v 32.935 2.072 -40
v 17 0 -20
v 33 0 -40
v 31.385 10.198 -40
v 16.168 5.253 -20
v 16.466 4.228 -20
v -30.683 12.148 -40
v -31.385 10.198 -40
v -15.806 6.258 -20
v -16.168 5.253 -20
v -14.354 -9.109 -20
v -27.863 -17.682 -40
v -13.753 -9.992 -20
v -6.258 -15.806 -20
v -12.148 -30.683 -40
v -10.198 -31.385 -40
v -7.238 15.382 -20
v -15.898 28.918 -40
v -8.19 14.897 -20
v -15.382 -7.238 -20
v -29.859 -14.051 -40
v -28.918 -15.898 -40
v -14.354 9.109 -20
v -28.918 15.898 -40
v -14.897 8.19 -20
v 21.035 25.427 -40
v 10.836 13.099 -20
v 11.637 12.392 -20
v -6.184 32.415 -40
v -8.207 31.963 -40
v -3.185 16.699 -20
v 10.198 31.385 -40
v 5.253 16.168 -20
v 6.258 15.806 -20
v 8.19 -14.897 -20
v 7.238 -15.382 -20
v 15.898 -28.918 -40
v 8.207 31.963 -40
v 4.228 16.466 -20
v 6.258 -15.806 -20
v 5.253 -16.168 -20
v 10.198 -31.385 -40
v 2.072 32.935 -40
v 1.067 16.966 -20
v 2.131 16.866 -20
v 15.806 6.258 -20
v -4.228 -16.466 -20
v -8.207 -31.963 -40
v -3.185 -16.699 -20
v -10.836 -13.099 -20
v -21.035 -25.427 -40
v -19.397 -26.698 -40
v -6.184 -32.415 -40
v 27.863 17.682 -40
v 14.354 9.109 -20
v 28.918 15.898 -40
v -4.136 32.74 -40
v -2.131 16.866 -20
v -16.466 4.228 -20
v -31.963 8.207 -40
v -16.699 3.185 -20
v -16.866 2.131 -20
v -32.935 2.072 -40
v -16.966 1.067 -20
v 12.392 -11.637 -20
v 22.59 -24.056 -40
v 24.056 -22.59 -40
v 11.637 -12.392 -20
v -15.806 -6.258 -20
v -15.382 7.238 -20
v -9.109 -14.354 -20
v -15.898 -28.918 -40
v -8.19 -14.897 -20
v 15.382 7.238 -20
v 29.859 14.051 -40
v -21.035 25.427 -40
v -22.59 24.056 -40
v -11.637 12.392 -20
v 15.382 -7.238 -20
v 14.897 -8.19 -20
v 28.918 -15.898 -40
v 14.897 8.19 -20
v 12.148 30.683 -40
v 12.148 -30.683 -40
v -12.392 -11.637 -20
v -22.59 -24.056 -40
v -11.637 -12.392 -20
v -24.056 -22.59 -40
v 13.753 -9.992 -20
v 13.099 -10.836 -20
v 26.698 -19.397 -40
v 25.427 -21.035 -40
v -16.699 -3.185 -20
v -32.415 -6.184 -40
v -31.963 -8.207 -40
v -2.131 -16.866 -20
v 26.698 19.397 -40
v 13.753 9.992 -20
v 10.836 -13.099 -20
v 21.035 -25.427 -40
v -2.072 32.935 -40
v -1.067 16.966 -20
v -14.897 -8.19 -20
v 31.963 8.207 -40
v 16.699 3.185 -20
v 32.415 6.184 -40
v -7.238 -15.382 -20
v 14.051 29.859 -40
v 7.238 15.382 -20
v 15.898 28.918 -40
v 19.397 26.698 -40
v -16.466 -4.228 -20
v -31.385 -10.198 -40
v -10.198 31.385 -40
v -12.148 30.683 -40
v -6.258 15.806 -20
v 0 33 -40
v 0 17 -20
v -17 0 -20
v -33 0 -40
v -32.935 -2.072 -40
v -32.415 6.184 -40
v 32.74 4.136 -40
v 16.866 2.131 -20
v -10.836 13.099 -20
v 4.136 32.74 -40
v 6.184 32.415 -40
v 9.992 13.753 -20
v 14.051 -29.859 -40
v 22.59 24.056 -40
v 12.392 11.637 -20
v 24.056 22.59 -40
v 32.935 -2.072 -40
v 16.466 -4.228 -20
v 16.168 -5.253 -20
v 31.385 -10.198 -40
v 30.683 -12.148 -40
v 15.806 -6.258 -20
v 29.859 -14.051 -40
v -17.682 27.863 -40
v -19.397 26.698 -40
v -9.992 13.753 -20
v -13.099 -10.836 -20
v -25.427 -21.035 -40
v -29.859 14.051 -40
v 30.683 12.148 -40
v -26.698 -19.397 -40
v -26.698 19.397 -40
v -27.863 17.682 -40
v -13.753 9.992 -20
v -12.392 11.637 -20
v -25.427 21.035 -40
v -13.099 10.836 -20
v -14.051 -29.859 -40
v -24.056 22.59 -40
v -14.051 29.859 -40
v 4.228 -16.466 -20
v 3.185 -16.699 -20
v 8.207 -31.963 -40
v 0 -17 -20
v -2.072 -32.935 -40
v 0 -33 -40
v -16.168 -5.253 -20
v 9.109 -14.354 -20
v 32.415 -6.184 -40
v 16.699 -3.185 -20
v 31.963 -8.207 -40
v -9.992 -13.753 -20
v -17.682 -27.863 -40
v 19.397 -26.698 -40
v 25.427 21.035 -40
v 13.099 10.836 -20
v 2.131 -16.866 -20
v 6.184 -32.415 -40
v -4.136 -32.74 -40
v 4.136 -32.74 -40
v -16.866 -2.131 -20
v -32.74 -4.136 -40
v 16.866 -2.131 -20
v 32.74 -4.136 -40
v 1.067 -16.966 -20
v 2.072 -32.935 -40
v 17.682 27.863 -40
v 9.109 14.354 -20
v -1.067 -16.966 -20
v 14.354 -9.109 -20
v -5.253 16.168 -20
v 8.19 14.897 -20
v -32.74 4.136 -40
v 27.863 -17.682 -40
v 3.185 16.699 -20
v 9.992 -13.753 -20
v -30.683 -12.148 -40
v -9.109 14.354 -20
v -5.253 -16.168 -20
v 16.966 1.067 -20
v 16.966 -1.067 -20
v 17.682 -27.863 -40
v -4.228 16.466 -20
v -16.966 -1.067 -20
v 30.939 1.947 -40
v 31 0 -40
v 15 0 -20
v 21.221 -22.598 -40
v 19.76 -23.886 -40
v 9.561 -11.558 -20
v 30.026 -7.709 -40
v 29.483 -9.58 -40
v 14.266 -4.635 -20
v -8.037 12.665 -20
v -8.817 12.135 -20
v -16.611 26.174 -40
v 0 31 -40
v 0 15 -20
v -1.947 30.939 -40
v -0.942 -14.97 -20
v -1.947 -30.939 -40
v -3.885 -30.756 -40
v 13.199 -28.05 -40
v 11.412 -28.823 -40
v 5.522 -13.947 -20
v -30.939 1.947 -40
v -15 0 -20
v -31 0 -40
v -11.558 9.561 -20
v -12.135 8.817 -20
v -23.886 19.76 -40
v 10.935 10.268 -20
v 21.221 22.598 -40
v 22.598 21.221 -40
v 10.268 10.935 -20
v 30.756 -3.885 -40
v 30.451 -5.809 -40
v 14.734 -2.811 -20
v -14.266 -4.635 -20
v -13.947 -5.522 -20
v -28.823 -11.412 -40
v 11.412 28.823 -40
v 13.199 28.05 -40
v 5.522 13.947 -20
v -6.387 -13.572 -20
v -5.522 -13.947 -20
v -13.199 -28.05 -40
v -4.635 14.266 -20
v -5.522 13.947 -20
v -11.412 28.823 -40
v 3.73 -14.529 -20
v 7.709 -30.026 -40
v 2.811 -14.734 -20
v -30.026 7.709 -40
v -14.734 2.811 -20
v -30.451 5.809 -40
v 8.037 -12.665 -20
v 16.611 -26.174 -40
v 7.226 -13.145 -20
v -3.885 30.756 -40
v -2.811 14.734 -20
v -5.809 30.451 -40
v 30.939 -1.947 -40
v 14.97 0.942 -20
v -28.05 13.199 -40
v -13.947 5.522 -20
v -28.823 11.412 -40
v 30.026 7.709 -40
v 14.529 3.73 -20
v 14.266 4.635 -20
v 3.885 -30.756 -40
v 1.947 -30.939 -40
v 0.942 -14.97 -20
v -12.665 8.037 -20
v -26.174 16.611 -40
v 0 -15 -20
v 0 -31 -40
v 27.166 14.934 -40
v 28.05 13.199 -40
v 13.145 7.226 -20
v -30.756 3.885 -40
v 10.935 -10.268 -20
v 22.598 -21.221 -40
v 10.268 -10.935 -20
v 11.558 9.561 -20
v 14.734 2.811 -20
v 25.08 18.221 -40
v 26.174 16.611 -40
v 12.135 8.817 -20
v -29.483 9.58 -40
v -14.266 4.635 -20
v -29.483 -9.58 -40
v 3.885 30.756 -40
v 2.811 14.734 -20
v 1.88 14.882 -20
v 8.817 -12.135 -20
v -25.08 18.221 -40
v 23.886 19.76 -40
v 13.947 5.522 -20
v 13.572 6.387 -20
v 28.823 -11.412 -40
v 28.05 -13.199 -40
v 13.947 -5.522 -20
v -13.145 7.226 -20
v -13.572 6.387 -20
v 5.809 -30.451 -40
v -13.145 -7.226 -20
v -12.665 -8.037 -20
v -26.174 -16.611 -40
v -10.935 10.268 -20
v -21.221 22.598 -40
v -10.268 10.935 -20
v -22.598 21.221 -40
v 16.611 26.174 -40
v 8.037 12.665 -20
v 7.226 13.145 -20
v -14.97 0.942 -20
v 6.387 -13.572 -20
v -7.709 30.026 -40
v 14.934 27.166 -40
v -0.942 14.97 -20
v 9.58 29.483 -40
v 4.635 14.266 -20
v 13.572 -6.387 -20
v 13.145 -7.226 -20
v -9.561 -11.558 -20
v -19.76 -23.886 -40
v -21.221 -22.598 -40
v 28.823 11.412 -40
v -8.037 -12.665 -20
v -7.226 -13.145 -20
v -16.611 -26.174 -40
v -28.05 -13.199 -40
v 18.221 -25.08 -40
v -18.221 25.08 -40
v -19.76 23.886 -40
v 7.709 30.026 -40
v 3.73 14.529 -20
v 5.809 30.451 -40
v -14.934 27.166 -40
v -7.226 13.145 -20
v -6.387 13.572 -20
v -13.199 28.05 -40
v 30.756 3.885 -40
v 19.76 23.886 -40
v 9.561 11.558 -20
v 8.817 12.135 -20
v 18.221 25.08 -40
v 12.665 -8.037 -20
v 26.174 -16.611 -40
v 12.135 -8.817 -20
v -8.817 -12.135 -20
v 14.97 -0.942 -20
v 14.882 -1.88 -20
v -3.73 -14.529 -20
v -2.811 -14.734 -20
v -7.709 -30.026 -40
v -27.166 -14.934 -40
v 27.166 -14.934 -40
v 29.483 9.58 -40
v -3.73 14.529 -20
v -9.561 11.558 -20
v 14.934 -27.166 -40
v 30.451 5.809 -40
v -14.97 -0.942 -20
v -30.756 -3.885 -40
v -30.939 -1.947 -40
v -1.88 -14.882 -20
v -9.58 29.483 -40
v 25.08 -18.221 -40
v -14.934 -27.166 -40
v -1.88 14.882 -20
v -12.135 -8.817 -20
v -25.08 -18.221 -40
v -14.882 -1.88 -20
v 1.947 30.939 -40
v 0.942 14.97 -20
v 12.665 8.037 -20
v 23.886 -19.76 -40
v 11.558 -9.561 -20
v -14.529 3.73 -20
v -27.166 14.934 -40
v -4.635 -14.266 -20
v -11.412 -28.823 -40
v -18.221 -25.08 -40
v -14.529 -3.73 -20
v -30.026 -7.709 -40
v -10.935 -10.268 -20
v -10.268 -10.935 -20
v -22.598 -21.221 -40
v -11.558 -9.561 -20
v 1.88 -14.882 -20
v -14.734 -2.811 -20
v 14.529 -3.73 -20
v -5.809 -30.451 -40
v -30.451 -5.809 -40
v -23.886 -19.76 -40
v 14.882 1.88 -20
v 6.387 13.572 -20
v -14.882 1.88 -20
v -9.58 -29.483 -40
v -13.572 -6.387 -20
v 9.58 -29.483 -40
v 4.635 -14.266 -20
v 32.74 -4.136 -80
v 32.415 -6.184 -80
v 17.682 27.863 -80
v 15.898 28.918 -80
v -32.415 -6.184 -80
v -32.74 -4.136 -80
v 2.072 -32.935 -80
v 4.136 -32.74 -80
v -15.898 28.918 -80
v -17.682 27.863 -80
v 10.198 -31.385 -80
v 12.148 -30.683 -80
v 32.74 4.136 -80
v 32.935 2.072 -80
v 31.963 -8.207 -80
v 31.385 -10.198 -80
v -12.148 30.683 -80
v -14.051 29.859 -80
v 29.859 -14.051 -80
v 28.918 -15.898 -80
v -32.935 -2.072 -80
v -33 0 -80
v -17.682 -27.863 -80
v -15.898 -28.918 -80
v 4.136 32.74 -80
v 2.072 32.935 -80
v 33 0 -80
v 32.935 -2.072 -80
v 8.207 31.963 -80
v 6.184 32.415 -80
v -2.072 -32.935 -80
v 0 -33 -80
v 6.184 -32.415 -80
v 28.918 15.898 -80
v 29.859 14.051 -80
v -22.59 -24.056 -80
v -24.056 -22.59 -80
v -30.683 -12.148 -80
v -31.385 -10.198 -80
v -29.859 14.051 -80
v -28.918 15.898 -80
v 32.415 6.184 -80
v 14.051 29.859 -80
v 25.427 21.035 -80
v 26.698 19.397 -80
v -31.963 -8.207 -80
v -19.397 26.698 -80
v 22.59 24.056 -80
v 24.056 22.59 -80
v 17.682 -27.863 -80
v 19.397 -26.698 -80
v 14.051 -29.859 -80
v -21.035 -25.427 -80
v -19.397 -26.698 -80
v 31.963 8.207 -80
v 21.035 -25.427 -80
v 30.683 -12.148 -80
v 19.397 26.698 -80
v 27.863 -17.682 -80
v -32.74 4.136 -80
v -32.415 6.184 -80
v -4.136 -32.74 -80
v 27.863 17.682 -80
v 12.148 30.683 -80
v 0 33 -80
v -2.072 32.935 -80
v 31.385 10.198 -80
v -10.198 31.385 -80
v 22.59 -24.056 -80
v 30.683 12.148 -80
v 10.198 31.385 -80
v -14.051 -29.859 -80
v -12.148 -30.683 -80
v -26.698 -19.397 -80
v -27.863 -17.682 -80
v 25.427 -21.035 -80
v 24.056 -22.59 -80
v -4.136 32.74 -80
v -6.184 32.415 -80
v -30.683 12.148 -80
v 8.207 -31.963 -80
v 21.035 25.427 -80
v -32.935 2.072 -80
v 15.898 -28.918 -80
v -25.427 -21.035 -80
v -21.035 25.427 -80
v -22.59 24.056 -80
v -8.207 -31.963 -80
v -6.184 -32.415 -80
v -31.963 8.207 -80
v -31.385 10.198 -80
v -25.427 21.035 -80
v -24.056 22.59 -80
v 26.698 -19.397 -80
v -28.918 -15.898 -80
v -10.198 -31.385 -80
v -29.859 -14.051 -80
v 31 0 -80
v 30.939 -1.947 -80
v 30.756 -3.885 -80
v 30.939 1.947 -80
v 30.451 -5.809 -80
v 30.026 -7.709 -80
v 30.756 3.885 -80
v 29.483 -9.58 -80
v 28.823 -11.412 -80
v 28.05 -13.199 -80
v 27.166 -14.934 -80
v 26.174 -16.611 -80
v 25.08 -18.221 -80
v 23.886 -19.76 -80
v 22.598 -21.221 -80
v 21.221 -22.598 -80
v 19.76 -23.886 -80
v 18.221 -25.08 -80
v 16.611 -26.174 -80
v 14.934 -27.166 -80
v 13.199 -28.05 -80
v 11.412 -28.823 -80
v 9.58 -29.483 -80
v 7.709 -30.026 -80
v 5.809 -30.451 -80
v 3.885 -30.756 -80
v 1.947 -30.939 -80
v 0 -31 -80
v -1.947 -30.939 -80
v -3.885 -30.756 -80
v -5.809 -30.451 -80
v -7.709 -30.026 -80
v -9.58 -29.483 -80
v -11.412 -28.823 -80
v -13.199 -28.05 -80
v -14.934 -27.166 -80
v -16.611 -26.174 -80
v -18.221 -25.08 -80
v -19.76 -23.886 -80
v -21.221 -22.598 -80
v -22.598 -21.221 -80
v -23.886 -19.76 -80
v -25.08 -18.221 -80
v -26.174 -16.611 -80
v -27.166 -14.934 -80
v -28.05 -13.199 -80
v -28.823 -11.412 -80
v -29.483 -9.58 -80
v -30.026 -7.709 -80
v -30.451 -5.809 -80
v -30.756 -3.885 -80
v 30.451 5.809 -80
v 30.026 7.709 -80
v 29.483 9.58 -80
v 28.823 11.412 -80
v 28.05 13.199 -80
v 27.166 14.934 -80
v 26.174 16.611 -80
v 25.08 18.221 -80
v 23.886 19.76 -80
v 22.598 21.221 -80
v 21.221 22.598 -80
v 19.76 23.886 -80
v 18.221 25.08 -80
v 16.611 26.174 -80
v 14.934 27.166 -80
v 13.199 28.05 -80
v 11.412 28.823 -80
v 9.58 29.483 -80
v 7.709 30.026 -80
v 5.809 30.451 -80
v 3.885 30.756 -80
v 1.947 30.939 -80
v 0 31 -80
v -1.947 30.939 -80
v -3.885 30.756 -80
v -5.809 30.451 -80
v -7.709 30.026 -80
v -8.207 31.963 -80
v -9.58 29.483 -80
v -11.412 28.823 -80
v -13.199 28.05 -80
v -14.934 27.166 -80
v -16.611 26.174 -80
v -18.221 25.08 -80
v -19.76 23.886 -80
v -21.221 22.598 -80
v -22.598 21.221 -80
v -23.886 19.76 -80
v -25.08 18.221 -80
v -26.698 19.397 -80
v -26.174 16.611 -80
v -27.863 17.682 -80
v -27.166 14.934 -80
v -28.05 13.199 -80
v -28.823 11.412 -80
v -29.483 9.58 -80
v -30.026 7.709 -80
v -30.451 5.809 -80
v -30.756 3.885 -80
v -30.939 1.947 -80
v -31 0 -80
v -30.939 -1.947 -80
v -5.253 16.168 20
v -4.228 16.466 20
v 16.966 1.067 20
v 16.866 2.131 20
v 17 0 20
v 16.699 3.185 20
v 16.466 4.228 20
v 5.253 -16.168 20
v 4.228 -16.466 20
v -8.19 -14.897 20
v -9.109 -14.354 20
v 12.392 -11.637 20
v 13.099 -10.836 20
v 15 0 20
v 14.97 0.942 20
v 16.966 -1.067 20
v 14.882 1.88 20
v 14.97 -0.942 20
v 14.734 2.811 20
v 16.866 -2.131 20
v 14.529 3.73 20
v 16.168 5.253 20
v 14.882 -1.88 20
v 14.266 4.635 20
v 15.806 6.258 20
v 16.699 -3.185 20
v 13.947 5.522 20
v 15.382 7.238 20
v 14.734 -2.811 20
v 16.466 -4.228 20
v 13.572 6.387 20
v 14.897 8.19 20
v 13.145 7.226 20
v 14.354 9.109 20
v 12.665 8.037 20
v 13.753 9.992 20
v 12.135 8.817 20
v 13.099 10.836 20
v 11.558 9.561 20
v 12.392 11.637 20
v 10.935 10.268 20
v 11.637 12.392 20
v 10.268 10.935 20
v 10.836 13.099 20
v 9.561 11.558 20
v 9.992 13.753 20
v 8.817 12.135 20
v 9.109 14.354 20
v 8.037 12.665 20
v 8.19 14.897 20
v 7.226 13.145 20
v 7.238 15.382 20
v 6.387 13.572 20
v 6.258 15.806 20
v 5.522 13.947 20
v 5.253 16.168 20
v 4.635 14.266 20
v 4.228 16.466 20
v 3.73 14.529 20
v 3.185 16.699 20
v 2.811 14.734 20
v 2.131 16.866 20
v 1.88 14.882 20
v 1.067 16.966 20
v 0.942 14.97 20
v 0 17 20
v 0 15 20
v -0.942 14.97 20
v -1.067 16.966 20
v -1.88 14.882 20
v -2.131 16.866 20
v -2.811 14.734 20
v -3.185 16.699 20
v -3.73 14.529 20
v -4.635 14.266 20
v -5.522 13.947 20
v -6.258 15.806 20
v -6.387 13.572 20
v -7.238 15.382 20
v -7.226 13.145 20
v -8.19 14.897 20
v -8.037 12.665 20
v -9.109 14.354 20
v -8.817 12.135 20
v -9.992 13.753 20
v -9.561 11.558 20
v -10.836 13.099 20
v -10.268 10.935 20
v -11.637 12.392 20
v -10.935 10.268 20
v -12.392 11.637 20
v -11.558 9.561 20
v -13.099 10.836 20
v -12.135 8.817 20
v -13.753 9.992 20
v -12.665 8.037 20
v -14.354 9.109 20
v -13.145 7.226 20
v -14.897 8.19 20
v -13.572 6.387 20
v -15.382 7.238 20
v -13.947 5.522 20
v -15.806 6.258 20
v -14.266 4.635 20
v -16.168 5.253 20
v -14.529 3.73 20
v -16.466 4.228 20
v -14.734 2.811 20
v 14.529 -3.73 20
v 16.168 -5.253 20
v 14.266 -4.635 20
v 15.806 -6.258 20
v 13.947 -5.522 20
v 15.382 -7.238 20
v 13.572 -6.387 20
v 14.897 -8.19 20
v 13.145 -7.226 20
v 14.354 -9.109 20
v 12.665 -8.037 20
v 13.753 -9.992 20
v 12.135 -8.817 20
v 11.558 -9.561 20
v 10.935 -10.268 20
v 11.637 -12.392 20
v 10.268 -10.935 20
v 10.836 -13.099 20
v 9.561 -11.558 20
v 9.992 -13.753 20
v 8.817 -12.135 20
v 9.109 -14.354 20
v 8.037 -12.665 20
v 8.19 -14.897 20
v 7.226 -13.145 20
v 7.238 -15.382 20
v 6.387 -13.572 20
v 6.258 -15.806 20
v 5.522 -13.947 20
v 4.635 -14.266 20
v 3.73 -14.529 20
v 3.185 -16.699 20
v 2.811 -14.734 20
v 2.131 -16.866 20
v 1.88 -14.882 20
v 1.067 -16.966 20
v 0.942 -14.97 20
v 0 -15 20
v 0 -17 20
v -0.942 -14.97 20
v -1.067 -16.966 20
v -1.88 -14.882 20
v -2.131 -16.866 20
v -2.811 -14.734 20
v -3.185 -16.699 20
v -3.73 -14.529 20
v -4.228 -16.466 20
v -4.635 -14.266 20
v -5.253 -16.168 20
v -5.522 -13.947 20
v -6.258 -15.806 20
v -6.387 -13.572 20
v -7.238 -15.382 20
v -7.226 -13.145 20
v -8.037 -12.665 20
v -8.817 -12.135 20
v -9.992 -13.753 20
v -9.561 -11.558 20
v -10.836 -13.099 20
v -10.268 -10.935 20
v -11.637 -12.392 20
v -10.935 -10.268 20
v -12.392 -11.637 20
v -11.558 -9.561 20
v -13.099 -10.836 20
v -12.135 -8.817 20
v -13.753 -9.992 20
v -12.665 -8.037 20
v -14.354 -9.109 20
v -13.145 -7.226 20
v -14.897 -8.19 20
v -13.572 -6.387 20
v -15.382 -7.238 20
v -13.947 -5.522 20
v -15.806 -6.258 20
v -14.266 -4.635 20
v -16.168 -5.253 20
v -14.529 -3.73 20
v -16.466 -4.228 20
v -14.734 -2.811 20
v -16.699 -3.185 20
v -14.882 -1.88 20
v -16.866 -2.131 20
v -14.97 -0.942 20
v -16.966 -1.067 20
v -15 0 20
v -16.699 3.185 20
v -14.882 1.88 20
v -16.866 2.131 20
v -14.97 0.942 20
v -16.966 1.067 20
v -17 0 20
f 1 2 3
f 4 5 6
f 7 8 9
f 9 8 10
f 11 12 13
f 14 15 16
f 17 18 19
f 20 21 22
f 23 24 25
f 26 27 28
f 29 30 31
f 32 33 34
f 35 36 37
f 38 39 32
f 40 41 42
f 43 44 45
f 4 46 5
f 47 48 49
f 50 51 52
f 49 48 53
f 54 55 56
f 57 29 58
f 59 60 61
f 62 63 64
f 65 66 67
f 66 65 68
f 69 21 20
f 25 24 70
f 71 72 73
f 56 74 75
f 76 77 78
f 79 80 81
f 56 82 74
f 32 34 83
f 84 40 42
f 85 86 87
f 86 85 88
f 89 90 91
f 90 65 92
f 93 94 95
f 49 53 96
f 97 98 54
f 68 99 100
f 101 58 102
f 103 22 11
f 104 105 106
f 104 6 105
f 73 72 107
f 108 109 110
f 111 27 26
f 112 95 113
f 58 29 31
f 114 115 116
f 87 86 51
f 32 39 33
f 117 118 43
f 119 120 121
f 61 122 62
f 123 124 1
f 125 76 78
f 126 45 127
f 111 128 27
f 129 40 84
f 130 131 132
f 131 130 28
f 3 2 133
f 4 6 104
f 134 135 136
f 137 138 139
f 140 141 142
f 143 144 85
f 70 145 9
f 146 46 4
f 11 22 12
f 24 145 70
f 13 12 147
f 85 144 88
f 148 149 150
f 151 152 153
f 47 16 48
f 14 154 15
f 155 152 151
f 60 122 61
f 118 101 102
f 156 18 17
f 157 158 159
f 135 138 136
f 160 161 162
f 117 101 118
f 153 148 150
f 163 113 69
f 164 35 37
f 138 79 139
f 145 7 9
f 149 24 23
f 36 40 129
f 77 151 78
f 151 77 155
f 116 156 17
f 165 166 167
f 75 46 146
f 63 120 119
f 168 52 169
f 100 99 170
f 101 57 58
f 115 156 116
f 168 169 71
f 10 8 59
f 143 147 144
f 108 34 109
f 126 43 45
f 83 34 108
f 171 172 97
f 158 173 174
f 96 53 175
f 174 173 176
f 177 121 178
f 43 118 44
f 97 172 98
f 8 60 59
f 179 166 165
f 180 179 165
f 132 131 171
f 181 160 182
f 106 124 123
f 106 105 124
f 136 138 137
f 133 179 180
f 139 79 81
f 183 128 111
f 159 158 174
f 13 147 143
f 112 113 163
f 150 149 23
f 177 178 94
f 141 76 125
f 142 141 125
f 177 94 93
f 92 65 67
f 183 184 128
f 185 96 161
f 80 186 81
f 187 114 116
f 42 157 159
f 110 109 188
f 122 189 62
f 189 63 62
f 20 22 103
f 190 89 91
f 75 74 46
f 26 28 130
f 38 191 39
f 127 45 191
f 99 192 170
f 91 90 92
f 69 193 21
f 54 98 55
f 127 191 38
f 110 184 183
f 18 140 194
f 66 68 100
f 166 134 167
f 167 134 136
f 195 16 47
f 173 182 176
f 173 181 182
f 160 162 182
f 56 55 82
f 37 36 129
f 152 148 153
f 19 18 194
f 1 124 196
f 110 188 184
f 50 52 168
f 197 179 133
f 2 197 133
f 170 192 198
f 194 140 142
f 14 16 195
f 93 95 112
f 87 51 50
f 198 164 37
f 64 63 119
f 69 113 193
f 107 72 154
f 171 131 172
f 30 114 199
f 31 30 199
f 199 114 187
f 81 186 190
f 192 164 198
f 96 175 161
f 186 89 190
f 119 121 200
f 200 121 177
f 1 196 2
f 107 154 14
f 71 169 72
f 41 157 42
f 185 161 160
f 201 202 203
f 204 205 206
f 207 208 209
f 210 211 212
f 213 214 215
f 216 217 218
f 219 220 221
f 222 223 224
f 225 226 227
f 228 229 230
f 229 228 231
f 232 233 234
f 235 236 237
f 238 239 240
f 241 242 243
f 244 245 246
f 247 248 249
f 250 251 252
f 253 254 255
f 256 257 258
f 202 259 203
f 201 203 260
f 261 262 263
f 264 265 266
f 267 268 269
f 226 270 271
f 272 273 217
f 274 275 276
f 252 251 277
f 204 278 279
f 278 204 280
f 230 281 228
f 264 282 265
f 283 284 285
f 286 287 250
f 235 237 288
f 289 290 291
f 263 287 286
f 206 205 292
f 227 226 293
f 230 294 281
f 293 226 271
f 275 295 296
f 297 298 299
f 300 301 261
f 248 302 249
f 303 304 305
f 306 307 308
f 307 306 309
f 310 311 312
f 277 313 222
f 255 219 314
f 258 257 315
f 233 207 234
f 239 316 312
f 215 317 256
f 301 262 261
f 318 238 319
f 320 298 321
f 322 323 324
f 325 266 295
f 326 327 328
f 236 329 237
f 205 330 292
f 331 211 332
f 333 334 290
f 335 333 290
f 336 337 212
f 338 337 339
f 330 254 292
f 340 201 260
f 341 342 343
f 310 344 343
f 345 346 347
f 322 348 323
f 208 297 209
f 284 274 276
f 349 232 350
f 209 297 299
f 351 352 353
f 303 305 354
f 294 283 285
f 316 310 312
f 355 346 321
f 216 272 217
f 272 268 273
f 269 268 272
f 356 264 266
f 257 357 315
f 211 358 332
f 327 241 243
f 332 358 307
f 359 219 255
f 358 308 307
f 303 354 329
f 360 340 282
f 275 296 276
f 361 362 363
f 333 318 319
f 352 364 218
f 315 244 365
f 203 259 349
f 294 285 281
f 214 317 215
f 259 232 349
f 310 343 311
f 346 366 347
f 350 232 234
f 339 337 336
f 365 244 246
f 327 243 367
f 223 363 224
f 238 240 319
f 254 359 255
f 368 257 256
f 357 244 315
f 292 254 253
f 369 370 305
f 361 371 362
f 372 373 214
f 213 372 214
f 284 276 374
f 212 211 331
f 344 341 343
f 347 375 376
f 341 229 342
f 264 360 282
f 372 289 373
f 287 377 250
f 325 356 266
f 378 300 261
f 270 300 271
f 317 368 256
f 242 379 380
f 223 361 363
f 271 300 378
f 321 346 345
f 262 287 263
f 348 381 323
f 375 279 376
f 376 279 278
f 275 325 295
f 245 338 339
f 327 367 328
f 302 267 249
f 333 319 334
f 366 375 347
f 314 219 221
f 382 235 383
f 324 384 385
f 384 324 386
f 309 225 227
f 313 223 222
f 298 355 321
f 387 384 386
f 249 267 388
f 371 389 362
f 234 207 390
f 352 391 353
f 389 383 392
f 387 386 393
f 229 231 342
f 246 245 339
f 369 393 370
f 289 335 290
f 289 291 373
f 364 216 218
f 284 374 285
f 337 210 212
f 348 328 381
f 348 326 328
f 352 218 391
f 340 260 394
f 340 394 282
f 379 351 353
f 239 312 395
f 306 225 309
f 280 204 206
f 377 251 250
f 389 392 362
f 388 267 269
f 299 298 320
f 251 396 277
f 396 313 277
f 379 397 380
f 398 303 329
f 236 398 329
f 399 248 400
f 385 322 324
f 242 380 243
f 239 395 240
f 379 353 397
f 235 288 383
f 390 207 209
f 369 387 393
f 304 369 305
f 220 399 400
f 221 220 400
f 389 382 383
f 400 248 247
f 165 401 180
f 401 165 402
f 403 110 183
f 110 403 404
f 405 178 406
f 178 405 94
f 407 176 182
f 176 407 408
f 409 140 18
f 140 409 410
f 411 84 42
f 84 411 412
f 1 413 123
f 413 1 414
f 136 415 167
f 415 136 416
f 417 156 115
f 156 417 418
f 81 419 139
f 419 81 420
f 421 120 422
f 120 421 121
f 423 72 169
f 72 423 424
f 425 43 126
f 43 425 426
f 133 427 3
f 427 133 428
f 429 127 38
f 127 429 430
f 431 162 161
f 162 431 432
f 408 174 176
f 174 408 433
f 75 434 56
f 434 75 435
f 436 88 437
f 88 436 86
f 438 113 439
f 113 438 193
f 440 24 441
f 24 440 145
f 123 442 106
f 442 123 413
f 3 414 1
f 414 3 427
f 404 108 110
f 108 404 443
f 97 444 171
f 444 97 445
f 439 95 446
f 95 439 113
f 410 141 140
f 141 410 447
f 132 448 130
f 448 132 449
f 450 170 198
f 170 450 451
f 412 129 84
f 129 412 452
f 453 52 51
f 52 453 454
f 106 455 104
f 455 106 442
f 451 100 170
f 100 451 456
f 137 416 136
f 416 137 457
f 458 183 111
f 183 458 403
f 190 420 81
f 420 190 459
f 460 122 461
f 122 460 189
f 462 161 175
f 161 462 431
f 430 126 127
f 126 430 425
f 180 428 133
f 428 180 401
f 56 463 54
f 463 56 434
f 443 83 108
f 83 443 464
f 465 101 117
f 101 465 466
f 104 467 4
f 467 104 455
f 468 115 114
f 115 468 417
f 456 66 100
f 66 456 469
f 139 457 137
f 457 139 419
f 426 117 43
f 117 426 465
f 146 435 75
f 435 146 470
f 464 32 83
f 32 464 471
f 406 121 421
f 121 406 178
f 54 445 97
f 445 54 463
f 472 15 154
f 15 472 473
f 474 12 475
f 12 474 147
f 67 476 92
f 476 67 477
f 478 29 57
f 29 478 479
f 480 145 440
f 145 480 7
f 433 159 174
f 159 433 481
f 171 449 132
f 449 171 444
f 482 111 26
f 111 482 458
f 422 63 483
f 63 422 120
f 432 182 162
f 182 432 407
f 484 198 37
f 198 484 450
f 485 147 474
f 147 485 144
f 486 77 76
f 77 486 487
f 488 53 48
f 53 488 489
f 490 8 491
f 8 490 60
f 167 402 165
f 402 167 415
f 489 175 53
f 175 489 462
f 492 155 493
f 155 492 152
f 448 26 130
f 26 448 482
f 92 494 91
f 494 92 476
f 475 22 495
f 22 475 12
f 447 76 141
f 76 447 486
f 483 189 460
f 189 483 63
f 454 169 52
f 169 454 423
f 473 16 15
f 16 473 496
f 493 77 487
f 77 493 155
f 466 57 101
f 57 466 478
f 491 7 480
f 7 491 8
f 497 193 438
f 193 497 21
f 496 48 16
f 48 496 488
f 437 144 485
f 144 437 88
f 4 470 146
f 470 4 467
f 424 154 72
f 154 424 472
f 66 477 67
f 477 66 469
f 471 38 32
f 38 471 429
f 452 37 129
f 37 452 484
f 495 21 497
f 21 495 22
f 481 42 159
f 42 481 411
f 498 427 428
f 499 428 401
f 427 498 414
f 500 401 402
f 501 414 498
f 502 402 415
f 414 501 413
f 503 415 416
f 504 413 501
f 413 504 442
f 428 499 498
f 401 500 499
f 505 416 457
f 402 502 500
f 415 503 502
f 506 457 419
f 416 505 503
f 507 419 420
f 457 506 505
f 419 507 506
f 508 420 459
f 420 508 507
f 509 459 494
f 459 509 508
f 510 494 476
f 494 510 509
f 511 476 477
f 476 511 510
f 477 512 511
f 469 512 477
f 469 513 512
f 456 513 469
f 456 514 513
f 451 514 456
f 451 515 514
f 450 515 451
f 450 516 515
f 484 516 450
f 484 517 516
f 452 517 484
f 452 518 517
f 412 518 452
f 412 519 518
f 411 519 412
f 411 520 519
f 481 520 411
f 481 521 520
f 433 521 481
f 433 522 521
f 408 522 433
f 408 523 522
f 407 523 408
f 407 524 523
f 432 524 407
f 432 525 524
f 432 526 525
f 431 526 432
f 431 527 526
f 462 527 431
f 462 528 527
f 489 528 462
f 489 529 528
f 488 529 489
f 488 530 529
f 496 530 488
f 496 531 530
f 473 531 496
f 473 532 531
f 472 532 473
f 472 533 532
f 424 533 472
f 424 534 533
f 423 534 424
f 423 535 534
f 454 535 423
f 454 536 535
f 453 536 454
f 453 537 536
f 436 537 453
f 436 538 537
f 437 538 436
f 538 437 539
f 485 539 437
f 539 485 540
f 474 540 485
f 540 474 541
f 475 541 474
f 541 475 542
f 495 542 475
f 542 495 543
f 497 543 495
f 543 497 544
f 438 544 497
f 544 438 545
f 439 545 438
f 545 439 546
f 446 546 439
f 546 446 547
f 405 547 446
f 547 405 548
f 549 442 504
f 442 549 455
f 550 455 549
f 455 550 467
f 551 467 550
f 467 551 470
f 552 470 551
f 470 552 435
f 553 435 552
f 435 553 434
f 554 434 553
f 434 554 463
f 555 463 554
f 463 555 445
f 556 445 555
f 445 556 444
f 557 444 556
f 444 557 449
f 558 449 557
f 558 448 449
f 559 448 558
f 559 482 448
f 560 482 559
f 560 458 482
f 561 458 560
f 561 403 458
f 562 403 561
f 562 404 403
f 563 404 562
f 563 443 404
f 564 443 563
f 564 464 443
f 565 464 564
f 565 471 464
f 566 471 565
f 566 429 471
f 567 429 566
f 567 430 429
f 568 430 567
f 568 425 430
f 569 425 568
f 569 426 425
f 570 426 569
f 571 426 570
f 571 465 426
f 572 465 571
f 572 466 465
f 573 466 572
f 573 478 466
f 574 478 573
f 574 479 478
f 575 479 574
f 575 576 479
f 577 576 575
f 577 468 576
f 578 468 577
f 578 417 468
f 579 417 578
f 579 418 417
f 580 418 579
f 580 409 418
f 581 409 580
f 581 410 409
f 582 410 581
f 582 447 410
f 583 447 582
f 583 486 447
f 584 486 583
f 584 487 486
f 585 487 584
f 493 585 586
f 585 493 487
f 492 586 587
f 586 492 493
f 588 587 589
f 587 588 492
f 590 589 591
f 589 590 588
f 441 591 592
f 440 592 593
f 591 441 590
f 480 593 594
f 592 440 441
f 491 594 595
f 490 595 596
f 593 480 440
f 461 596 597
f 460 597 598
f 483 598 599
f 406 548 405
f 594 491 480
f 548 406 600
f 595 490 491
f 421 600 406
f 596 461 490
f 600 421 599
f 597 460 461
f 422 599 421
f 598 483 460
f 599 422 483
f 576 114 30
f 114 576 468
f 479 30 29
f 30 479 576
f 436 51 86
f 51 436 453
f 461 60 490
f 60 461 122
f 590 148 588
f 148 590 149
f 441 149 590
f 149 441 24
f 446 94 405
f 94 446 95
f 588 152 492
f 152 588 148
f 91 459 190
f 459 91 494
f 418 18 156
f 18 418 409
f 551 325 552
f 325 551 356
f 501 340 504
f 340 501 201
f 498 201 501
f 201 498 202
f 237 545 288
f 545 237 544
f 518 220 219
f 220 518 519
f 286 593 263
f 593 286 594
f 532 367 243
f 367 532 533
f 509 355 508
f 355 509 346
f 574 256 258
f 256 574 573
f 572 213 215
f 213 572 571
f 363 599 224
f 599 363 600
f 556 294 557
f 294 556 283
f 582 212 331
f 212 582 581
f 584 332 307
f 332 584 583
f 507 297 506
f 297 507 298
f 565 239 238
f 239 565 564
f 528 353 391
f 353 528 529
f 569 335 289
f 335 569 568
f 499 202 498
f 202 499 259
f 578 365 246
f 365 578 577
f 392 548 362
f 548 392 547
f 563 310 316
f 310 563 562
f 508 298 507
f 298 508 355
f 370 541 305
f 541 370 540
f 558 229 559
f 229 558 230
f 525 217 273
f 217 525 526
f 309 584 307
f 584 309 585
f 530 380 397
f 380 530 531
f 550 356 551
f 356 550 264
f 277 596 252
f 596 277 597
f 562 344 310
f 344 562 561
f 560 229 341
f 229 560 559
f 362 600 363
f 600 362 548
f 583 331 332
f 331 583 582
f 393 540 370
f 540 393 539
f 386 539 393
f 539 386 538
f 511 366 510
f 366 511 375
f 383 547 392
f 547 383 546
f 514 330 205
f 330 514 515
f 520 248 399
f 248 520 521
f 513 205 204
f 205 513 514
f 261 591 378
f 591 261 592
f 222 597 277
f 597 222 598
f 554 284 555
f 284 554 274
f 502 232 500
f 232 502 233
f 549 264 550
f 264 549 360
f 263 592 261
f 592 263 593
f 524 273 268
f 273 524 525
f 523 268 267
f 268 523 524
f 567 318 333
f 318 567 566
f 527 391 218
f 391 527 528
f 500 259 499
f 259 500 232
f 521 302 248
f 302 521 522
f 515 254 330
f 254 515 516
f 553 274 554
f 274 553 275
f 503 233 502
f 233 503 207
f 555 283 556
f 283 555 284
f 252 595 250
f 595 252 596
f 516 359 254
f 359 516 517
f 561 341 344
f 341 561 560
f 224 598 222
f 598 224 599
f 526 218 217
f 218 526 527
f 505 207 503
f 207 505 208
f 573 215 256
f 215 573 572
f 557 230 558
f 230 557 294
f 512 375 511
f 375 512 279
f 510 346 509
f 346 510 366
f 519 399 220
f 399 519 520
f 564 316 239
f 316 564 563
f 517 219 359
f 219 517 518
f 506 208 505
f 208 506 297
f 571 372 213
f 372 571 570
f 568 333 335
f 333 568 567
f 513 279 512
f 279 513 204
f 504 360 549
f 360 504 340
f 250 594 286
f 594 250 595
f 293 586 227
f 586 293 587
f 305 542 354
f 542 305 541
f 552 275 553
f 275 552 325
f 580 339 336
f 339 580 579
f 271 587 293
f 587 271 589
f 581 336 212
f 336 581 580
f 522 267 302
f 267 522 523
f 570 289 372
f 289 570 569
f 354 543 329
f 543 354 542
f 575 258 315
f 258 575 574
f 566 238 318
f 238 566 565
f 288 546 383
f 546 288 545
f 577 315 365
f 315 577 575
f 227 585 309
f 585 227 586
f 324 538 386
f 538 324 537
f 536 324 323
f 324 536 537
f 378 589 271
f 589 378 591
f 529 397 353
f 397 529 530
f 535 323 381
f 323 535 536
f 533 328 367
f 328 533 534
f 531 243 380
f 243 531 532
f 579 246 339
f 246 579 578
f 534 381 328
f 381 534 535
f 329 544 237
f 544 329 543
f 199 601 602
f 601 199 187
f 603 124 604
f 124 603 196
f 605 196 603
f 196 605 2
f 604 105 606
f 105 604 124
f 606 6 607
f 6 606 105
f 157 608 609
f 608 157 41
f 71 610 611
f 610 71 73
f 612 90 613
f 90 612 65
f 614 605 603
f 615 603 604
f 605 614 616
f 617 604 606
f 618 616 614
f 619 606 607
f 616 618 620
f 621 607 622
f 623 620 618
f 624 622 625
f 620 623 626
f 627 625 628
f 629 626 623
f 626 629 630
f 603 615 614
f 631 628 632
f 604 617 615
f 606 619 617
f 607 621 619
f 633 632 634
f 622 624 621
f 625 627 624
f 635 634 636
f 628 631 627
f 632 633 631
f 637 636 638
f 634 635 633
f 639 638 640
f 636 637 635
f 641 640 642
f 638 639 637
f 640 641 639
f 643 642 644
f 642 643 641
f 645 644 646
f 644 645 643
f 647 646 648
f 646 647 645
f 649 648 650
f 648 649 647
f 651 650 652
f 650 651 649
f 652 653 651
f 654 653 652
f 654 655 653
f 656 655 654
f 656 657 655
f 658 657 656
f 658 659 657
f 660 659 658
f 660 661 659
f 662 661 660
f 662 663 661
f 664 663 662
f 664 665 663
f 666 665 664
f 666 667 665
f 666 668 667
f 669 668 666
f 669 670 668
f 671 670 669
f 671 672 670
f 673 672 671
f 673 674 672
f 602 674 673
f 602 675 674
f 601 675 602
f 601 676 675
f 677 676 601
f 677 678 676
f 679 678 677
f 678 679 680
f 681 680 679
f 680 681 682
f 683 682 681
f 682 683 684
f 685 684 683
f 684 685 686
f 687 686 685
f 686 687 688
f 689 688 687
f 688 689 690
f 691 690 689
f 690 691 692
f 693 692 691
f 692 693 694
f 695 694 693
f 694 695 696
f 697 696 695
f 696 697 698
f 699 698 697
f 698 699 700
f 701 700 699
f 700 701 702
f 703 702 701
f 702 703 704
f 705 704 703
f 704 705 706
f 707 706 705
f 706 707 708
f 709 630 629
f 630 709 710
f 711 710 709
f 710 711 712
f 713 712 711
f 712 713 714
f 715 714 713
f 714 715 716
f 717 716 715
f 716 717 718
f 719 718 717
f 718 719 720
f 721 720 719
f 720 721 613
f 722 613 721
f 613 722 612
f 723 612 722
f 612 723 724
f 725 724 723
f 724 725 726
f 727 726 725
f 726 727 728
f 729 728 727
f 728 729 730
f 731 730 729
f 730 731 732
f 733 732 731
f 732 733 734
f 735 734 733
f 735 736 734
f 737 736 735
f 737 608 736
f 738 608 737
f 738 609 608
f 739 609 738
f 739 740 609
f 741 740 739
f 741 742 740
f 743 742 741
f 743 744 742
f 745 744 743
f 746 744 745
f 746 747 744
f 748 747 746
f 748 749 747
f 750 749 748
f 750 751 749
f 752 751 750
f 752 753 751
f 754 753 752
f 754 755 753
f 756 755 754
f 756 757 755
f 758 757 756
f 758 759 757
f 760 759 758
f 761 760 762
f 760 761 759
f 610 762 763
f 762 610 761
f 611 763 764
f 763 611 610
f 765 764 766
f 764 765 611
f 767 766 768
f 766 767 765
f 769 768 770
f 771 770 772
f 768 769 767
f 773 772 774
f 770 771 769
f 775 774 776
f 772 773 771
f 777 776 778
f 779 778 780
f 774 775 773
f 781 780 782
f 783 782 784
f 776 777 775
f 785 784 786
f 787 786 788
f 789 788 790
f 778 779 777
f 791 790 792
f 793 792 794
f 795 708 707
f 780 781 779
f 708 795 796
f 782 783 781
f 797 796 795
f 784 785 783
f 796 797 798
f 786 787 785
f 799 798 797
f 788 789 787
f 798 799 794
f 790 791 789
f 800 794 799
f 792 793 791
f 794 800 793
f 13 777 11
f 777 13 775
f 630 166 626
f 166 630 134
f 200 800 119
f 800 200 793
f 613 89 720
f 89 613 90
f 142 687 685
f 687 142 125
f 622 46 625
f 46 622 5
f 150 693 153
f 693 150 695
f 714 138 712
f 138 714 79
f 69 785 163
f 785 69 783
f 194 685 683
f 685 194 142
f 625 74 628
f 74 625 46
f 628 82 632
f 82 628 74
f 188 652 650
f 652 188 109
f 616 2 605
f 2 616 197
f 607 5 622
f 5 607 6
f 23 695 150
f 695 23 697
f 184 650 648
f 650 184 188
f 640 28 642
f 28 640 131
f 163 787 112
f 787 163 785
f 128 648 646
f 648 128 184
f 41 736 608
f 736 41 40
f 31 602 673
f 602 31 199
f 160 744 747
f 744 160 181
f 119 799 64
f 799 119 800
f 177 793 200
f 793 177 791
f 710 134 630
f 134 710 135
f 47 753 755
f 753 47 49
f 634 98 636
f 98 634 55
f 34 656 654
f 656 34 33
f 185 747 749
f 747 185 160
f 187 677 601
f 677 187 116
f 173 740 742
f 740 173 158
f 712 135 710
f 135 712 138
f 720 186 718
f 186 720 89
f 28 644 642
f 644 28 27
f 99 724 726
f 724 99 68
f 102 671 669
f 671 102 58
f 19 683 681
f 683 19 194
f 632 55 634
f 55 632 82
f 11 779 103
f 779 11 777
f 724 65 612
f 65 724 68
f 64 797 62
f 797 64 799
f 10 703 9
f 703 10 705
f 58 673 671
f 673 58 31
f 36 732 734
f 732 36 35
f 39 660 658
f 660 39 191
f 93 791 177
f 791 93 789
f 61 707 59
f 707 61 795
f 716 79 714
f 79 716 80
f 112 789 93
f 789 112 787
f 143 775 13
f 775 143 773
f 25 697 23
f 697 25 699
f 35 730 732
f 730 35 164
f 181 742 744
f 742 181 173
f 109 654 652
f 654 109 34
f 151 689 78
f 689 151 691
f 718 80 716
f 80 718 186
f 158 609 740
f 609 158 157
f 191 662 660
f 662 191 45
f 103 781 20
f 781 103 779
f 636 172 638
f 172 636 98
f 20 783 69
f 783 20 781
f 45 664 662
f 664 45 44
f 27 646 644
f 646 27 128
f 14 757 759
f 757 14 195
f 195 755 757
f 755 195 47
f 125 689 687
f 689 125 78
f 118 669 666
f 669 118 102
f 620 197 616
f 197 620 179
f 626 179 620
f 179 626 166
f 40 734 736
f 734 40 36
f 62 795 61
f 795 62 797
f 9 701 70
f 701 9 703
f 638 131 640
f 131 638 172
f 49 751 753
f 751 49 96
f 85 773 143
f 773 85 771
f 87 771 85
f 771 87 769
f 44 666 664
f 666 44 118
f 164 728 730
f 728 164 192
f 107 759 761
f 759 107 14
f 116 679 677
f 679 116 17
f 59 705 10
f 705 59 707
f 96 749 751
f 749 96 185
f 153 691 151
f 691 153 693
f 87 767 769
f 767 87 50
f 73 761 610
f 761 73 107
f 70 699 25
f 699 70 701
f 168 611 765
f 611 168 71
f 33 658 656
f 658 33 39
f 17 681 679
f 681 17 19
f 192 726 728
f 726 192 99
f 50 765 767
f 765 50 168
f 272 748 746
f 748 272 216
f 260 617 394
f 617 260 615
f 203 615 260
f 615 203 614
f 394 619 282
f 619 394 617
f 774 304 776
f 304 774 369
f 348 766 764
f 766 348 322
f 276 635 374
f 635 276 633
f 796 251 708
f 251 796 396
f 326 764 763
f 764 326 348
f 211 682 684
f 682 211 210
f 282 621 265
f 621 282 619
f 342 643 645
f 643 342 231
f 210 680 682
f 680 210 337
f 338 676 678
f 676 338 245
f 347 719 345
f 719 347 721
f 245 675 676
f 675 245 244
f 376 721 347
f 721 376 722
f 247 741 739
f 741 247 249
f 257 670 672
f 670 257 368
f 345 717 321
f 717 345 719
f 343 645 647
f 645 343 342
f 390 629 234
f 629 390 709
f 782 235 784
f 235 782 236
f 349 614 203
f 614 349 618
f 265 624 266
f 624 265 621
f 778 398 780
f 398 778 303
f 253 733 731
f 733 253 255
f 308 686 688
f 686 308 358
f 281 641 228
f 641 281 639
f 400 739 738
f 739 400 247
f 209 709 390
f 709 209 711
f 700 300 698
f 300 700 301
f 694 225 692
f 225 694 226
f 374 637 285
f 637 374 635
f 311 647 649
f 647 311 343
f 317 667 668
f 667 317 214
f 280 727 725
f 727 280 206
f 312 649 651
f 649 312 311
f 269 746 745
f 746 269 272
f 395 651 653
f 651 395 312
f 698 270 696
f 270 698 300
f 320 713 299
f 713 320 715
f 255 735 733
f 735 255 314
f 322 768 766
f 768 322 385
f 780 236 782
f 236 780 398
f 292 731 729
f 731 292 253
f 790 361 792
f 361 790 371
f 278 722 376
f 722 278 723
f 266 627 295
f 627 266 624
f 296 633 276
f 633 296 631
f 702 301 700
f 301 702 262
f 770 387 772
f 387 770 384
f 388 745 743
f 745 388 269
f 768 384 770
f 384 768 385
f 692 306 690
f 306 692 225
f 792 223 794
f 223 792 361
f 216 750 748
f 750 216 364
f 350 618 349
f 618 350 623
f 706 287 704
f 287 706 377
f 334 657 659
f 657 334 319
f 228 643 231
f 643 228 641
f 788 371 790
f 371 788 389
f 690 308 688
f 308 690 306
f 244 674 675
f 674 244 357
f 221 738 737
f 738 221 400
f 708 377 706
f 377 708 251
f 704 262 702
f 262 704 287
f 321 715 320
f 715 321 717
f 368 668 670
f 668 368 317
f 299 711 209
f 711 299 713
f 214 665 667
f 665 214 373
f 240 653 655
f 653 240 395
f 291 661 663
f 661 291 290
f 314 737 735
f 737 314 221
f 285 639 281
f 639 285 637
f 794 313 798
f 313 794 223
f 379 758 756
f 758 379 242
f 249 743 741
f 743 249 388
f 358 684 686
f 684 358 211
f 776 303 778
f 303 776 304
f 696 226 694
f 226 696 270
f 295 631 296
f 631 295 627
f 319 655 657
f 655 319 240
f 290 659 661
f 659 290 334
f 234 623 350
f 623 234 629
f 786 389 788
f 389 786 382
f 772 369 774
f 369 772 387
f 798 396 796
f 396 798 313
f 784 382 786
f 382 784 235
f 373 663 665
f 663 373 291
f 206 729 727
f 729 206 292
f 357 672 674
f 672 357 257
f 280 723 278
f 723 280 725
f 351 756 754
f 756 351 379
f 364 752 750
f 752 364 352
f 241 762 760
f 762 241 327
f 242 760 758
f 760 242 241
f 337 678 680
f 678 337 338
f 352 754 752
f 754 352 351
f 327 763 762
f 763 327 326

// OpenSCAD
//power tool vacuum adaptor
//vacuum hose side is female, covers vacuum nozzle 
//tool side is female, covers tool port

//set parameter for adaptor wall thickness
aw = 2;

//set parameter for mid-taper 
mh = 20;


//set parameters for vacuum adaptor
//this is set to the outside radius of your nozzle
//with the wall thickness added 
vr_top=(15 + aw);

//vr_end is the radius of your tool port plus wall
vr_end= (31 + aw);
vh=40;

//set adaptor length (fits tool and vac)

//set parameters for tool side
tr=vr_end;
th=40;

//code below creates two pipes and addes them together

$fn=100;
union() 
{
translate ([0,0,-th]) union() 
{
  //create size taper and hollow it 
  difference() 
      {
          cylinder(mh,vr_end, vr_top);
          cylinder(mh,vr_end-aw, vr_top-aw);
      }
  //create tool port cylinder and hollow it and move it
     translate([0,0,-th]) 
 {
          difference () 
    {
          cylinder(th, tr, tr, false );
          cylinder(th, tr-aw, tr-aw, false); 
    }
  }
}
   //create vacuum nozzle cylinder and hollow it  
          translate([0,0,-mh])
             difference ()
     {
         cylinder(th, vr_top, vr_top);
         cylinder(th, vr_top-aw, vr_top-aw);
     } 
}
//micheal.obraoin@gmail.com
